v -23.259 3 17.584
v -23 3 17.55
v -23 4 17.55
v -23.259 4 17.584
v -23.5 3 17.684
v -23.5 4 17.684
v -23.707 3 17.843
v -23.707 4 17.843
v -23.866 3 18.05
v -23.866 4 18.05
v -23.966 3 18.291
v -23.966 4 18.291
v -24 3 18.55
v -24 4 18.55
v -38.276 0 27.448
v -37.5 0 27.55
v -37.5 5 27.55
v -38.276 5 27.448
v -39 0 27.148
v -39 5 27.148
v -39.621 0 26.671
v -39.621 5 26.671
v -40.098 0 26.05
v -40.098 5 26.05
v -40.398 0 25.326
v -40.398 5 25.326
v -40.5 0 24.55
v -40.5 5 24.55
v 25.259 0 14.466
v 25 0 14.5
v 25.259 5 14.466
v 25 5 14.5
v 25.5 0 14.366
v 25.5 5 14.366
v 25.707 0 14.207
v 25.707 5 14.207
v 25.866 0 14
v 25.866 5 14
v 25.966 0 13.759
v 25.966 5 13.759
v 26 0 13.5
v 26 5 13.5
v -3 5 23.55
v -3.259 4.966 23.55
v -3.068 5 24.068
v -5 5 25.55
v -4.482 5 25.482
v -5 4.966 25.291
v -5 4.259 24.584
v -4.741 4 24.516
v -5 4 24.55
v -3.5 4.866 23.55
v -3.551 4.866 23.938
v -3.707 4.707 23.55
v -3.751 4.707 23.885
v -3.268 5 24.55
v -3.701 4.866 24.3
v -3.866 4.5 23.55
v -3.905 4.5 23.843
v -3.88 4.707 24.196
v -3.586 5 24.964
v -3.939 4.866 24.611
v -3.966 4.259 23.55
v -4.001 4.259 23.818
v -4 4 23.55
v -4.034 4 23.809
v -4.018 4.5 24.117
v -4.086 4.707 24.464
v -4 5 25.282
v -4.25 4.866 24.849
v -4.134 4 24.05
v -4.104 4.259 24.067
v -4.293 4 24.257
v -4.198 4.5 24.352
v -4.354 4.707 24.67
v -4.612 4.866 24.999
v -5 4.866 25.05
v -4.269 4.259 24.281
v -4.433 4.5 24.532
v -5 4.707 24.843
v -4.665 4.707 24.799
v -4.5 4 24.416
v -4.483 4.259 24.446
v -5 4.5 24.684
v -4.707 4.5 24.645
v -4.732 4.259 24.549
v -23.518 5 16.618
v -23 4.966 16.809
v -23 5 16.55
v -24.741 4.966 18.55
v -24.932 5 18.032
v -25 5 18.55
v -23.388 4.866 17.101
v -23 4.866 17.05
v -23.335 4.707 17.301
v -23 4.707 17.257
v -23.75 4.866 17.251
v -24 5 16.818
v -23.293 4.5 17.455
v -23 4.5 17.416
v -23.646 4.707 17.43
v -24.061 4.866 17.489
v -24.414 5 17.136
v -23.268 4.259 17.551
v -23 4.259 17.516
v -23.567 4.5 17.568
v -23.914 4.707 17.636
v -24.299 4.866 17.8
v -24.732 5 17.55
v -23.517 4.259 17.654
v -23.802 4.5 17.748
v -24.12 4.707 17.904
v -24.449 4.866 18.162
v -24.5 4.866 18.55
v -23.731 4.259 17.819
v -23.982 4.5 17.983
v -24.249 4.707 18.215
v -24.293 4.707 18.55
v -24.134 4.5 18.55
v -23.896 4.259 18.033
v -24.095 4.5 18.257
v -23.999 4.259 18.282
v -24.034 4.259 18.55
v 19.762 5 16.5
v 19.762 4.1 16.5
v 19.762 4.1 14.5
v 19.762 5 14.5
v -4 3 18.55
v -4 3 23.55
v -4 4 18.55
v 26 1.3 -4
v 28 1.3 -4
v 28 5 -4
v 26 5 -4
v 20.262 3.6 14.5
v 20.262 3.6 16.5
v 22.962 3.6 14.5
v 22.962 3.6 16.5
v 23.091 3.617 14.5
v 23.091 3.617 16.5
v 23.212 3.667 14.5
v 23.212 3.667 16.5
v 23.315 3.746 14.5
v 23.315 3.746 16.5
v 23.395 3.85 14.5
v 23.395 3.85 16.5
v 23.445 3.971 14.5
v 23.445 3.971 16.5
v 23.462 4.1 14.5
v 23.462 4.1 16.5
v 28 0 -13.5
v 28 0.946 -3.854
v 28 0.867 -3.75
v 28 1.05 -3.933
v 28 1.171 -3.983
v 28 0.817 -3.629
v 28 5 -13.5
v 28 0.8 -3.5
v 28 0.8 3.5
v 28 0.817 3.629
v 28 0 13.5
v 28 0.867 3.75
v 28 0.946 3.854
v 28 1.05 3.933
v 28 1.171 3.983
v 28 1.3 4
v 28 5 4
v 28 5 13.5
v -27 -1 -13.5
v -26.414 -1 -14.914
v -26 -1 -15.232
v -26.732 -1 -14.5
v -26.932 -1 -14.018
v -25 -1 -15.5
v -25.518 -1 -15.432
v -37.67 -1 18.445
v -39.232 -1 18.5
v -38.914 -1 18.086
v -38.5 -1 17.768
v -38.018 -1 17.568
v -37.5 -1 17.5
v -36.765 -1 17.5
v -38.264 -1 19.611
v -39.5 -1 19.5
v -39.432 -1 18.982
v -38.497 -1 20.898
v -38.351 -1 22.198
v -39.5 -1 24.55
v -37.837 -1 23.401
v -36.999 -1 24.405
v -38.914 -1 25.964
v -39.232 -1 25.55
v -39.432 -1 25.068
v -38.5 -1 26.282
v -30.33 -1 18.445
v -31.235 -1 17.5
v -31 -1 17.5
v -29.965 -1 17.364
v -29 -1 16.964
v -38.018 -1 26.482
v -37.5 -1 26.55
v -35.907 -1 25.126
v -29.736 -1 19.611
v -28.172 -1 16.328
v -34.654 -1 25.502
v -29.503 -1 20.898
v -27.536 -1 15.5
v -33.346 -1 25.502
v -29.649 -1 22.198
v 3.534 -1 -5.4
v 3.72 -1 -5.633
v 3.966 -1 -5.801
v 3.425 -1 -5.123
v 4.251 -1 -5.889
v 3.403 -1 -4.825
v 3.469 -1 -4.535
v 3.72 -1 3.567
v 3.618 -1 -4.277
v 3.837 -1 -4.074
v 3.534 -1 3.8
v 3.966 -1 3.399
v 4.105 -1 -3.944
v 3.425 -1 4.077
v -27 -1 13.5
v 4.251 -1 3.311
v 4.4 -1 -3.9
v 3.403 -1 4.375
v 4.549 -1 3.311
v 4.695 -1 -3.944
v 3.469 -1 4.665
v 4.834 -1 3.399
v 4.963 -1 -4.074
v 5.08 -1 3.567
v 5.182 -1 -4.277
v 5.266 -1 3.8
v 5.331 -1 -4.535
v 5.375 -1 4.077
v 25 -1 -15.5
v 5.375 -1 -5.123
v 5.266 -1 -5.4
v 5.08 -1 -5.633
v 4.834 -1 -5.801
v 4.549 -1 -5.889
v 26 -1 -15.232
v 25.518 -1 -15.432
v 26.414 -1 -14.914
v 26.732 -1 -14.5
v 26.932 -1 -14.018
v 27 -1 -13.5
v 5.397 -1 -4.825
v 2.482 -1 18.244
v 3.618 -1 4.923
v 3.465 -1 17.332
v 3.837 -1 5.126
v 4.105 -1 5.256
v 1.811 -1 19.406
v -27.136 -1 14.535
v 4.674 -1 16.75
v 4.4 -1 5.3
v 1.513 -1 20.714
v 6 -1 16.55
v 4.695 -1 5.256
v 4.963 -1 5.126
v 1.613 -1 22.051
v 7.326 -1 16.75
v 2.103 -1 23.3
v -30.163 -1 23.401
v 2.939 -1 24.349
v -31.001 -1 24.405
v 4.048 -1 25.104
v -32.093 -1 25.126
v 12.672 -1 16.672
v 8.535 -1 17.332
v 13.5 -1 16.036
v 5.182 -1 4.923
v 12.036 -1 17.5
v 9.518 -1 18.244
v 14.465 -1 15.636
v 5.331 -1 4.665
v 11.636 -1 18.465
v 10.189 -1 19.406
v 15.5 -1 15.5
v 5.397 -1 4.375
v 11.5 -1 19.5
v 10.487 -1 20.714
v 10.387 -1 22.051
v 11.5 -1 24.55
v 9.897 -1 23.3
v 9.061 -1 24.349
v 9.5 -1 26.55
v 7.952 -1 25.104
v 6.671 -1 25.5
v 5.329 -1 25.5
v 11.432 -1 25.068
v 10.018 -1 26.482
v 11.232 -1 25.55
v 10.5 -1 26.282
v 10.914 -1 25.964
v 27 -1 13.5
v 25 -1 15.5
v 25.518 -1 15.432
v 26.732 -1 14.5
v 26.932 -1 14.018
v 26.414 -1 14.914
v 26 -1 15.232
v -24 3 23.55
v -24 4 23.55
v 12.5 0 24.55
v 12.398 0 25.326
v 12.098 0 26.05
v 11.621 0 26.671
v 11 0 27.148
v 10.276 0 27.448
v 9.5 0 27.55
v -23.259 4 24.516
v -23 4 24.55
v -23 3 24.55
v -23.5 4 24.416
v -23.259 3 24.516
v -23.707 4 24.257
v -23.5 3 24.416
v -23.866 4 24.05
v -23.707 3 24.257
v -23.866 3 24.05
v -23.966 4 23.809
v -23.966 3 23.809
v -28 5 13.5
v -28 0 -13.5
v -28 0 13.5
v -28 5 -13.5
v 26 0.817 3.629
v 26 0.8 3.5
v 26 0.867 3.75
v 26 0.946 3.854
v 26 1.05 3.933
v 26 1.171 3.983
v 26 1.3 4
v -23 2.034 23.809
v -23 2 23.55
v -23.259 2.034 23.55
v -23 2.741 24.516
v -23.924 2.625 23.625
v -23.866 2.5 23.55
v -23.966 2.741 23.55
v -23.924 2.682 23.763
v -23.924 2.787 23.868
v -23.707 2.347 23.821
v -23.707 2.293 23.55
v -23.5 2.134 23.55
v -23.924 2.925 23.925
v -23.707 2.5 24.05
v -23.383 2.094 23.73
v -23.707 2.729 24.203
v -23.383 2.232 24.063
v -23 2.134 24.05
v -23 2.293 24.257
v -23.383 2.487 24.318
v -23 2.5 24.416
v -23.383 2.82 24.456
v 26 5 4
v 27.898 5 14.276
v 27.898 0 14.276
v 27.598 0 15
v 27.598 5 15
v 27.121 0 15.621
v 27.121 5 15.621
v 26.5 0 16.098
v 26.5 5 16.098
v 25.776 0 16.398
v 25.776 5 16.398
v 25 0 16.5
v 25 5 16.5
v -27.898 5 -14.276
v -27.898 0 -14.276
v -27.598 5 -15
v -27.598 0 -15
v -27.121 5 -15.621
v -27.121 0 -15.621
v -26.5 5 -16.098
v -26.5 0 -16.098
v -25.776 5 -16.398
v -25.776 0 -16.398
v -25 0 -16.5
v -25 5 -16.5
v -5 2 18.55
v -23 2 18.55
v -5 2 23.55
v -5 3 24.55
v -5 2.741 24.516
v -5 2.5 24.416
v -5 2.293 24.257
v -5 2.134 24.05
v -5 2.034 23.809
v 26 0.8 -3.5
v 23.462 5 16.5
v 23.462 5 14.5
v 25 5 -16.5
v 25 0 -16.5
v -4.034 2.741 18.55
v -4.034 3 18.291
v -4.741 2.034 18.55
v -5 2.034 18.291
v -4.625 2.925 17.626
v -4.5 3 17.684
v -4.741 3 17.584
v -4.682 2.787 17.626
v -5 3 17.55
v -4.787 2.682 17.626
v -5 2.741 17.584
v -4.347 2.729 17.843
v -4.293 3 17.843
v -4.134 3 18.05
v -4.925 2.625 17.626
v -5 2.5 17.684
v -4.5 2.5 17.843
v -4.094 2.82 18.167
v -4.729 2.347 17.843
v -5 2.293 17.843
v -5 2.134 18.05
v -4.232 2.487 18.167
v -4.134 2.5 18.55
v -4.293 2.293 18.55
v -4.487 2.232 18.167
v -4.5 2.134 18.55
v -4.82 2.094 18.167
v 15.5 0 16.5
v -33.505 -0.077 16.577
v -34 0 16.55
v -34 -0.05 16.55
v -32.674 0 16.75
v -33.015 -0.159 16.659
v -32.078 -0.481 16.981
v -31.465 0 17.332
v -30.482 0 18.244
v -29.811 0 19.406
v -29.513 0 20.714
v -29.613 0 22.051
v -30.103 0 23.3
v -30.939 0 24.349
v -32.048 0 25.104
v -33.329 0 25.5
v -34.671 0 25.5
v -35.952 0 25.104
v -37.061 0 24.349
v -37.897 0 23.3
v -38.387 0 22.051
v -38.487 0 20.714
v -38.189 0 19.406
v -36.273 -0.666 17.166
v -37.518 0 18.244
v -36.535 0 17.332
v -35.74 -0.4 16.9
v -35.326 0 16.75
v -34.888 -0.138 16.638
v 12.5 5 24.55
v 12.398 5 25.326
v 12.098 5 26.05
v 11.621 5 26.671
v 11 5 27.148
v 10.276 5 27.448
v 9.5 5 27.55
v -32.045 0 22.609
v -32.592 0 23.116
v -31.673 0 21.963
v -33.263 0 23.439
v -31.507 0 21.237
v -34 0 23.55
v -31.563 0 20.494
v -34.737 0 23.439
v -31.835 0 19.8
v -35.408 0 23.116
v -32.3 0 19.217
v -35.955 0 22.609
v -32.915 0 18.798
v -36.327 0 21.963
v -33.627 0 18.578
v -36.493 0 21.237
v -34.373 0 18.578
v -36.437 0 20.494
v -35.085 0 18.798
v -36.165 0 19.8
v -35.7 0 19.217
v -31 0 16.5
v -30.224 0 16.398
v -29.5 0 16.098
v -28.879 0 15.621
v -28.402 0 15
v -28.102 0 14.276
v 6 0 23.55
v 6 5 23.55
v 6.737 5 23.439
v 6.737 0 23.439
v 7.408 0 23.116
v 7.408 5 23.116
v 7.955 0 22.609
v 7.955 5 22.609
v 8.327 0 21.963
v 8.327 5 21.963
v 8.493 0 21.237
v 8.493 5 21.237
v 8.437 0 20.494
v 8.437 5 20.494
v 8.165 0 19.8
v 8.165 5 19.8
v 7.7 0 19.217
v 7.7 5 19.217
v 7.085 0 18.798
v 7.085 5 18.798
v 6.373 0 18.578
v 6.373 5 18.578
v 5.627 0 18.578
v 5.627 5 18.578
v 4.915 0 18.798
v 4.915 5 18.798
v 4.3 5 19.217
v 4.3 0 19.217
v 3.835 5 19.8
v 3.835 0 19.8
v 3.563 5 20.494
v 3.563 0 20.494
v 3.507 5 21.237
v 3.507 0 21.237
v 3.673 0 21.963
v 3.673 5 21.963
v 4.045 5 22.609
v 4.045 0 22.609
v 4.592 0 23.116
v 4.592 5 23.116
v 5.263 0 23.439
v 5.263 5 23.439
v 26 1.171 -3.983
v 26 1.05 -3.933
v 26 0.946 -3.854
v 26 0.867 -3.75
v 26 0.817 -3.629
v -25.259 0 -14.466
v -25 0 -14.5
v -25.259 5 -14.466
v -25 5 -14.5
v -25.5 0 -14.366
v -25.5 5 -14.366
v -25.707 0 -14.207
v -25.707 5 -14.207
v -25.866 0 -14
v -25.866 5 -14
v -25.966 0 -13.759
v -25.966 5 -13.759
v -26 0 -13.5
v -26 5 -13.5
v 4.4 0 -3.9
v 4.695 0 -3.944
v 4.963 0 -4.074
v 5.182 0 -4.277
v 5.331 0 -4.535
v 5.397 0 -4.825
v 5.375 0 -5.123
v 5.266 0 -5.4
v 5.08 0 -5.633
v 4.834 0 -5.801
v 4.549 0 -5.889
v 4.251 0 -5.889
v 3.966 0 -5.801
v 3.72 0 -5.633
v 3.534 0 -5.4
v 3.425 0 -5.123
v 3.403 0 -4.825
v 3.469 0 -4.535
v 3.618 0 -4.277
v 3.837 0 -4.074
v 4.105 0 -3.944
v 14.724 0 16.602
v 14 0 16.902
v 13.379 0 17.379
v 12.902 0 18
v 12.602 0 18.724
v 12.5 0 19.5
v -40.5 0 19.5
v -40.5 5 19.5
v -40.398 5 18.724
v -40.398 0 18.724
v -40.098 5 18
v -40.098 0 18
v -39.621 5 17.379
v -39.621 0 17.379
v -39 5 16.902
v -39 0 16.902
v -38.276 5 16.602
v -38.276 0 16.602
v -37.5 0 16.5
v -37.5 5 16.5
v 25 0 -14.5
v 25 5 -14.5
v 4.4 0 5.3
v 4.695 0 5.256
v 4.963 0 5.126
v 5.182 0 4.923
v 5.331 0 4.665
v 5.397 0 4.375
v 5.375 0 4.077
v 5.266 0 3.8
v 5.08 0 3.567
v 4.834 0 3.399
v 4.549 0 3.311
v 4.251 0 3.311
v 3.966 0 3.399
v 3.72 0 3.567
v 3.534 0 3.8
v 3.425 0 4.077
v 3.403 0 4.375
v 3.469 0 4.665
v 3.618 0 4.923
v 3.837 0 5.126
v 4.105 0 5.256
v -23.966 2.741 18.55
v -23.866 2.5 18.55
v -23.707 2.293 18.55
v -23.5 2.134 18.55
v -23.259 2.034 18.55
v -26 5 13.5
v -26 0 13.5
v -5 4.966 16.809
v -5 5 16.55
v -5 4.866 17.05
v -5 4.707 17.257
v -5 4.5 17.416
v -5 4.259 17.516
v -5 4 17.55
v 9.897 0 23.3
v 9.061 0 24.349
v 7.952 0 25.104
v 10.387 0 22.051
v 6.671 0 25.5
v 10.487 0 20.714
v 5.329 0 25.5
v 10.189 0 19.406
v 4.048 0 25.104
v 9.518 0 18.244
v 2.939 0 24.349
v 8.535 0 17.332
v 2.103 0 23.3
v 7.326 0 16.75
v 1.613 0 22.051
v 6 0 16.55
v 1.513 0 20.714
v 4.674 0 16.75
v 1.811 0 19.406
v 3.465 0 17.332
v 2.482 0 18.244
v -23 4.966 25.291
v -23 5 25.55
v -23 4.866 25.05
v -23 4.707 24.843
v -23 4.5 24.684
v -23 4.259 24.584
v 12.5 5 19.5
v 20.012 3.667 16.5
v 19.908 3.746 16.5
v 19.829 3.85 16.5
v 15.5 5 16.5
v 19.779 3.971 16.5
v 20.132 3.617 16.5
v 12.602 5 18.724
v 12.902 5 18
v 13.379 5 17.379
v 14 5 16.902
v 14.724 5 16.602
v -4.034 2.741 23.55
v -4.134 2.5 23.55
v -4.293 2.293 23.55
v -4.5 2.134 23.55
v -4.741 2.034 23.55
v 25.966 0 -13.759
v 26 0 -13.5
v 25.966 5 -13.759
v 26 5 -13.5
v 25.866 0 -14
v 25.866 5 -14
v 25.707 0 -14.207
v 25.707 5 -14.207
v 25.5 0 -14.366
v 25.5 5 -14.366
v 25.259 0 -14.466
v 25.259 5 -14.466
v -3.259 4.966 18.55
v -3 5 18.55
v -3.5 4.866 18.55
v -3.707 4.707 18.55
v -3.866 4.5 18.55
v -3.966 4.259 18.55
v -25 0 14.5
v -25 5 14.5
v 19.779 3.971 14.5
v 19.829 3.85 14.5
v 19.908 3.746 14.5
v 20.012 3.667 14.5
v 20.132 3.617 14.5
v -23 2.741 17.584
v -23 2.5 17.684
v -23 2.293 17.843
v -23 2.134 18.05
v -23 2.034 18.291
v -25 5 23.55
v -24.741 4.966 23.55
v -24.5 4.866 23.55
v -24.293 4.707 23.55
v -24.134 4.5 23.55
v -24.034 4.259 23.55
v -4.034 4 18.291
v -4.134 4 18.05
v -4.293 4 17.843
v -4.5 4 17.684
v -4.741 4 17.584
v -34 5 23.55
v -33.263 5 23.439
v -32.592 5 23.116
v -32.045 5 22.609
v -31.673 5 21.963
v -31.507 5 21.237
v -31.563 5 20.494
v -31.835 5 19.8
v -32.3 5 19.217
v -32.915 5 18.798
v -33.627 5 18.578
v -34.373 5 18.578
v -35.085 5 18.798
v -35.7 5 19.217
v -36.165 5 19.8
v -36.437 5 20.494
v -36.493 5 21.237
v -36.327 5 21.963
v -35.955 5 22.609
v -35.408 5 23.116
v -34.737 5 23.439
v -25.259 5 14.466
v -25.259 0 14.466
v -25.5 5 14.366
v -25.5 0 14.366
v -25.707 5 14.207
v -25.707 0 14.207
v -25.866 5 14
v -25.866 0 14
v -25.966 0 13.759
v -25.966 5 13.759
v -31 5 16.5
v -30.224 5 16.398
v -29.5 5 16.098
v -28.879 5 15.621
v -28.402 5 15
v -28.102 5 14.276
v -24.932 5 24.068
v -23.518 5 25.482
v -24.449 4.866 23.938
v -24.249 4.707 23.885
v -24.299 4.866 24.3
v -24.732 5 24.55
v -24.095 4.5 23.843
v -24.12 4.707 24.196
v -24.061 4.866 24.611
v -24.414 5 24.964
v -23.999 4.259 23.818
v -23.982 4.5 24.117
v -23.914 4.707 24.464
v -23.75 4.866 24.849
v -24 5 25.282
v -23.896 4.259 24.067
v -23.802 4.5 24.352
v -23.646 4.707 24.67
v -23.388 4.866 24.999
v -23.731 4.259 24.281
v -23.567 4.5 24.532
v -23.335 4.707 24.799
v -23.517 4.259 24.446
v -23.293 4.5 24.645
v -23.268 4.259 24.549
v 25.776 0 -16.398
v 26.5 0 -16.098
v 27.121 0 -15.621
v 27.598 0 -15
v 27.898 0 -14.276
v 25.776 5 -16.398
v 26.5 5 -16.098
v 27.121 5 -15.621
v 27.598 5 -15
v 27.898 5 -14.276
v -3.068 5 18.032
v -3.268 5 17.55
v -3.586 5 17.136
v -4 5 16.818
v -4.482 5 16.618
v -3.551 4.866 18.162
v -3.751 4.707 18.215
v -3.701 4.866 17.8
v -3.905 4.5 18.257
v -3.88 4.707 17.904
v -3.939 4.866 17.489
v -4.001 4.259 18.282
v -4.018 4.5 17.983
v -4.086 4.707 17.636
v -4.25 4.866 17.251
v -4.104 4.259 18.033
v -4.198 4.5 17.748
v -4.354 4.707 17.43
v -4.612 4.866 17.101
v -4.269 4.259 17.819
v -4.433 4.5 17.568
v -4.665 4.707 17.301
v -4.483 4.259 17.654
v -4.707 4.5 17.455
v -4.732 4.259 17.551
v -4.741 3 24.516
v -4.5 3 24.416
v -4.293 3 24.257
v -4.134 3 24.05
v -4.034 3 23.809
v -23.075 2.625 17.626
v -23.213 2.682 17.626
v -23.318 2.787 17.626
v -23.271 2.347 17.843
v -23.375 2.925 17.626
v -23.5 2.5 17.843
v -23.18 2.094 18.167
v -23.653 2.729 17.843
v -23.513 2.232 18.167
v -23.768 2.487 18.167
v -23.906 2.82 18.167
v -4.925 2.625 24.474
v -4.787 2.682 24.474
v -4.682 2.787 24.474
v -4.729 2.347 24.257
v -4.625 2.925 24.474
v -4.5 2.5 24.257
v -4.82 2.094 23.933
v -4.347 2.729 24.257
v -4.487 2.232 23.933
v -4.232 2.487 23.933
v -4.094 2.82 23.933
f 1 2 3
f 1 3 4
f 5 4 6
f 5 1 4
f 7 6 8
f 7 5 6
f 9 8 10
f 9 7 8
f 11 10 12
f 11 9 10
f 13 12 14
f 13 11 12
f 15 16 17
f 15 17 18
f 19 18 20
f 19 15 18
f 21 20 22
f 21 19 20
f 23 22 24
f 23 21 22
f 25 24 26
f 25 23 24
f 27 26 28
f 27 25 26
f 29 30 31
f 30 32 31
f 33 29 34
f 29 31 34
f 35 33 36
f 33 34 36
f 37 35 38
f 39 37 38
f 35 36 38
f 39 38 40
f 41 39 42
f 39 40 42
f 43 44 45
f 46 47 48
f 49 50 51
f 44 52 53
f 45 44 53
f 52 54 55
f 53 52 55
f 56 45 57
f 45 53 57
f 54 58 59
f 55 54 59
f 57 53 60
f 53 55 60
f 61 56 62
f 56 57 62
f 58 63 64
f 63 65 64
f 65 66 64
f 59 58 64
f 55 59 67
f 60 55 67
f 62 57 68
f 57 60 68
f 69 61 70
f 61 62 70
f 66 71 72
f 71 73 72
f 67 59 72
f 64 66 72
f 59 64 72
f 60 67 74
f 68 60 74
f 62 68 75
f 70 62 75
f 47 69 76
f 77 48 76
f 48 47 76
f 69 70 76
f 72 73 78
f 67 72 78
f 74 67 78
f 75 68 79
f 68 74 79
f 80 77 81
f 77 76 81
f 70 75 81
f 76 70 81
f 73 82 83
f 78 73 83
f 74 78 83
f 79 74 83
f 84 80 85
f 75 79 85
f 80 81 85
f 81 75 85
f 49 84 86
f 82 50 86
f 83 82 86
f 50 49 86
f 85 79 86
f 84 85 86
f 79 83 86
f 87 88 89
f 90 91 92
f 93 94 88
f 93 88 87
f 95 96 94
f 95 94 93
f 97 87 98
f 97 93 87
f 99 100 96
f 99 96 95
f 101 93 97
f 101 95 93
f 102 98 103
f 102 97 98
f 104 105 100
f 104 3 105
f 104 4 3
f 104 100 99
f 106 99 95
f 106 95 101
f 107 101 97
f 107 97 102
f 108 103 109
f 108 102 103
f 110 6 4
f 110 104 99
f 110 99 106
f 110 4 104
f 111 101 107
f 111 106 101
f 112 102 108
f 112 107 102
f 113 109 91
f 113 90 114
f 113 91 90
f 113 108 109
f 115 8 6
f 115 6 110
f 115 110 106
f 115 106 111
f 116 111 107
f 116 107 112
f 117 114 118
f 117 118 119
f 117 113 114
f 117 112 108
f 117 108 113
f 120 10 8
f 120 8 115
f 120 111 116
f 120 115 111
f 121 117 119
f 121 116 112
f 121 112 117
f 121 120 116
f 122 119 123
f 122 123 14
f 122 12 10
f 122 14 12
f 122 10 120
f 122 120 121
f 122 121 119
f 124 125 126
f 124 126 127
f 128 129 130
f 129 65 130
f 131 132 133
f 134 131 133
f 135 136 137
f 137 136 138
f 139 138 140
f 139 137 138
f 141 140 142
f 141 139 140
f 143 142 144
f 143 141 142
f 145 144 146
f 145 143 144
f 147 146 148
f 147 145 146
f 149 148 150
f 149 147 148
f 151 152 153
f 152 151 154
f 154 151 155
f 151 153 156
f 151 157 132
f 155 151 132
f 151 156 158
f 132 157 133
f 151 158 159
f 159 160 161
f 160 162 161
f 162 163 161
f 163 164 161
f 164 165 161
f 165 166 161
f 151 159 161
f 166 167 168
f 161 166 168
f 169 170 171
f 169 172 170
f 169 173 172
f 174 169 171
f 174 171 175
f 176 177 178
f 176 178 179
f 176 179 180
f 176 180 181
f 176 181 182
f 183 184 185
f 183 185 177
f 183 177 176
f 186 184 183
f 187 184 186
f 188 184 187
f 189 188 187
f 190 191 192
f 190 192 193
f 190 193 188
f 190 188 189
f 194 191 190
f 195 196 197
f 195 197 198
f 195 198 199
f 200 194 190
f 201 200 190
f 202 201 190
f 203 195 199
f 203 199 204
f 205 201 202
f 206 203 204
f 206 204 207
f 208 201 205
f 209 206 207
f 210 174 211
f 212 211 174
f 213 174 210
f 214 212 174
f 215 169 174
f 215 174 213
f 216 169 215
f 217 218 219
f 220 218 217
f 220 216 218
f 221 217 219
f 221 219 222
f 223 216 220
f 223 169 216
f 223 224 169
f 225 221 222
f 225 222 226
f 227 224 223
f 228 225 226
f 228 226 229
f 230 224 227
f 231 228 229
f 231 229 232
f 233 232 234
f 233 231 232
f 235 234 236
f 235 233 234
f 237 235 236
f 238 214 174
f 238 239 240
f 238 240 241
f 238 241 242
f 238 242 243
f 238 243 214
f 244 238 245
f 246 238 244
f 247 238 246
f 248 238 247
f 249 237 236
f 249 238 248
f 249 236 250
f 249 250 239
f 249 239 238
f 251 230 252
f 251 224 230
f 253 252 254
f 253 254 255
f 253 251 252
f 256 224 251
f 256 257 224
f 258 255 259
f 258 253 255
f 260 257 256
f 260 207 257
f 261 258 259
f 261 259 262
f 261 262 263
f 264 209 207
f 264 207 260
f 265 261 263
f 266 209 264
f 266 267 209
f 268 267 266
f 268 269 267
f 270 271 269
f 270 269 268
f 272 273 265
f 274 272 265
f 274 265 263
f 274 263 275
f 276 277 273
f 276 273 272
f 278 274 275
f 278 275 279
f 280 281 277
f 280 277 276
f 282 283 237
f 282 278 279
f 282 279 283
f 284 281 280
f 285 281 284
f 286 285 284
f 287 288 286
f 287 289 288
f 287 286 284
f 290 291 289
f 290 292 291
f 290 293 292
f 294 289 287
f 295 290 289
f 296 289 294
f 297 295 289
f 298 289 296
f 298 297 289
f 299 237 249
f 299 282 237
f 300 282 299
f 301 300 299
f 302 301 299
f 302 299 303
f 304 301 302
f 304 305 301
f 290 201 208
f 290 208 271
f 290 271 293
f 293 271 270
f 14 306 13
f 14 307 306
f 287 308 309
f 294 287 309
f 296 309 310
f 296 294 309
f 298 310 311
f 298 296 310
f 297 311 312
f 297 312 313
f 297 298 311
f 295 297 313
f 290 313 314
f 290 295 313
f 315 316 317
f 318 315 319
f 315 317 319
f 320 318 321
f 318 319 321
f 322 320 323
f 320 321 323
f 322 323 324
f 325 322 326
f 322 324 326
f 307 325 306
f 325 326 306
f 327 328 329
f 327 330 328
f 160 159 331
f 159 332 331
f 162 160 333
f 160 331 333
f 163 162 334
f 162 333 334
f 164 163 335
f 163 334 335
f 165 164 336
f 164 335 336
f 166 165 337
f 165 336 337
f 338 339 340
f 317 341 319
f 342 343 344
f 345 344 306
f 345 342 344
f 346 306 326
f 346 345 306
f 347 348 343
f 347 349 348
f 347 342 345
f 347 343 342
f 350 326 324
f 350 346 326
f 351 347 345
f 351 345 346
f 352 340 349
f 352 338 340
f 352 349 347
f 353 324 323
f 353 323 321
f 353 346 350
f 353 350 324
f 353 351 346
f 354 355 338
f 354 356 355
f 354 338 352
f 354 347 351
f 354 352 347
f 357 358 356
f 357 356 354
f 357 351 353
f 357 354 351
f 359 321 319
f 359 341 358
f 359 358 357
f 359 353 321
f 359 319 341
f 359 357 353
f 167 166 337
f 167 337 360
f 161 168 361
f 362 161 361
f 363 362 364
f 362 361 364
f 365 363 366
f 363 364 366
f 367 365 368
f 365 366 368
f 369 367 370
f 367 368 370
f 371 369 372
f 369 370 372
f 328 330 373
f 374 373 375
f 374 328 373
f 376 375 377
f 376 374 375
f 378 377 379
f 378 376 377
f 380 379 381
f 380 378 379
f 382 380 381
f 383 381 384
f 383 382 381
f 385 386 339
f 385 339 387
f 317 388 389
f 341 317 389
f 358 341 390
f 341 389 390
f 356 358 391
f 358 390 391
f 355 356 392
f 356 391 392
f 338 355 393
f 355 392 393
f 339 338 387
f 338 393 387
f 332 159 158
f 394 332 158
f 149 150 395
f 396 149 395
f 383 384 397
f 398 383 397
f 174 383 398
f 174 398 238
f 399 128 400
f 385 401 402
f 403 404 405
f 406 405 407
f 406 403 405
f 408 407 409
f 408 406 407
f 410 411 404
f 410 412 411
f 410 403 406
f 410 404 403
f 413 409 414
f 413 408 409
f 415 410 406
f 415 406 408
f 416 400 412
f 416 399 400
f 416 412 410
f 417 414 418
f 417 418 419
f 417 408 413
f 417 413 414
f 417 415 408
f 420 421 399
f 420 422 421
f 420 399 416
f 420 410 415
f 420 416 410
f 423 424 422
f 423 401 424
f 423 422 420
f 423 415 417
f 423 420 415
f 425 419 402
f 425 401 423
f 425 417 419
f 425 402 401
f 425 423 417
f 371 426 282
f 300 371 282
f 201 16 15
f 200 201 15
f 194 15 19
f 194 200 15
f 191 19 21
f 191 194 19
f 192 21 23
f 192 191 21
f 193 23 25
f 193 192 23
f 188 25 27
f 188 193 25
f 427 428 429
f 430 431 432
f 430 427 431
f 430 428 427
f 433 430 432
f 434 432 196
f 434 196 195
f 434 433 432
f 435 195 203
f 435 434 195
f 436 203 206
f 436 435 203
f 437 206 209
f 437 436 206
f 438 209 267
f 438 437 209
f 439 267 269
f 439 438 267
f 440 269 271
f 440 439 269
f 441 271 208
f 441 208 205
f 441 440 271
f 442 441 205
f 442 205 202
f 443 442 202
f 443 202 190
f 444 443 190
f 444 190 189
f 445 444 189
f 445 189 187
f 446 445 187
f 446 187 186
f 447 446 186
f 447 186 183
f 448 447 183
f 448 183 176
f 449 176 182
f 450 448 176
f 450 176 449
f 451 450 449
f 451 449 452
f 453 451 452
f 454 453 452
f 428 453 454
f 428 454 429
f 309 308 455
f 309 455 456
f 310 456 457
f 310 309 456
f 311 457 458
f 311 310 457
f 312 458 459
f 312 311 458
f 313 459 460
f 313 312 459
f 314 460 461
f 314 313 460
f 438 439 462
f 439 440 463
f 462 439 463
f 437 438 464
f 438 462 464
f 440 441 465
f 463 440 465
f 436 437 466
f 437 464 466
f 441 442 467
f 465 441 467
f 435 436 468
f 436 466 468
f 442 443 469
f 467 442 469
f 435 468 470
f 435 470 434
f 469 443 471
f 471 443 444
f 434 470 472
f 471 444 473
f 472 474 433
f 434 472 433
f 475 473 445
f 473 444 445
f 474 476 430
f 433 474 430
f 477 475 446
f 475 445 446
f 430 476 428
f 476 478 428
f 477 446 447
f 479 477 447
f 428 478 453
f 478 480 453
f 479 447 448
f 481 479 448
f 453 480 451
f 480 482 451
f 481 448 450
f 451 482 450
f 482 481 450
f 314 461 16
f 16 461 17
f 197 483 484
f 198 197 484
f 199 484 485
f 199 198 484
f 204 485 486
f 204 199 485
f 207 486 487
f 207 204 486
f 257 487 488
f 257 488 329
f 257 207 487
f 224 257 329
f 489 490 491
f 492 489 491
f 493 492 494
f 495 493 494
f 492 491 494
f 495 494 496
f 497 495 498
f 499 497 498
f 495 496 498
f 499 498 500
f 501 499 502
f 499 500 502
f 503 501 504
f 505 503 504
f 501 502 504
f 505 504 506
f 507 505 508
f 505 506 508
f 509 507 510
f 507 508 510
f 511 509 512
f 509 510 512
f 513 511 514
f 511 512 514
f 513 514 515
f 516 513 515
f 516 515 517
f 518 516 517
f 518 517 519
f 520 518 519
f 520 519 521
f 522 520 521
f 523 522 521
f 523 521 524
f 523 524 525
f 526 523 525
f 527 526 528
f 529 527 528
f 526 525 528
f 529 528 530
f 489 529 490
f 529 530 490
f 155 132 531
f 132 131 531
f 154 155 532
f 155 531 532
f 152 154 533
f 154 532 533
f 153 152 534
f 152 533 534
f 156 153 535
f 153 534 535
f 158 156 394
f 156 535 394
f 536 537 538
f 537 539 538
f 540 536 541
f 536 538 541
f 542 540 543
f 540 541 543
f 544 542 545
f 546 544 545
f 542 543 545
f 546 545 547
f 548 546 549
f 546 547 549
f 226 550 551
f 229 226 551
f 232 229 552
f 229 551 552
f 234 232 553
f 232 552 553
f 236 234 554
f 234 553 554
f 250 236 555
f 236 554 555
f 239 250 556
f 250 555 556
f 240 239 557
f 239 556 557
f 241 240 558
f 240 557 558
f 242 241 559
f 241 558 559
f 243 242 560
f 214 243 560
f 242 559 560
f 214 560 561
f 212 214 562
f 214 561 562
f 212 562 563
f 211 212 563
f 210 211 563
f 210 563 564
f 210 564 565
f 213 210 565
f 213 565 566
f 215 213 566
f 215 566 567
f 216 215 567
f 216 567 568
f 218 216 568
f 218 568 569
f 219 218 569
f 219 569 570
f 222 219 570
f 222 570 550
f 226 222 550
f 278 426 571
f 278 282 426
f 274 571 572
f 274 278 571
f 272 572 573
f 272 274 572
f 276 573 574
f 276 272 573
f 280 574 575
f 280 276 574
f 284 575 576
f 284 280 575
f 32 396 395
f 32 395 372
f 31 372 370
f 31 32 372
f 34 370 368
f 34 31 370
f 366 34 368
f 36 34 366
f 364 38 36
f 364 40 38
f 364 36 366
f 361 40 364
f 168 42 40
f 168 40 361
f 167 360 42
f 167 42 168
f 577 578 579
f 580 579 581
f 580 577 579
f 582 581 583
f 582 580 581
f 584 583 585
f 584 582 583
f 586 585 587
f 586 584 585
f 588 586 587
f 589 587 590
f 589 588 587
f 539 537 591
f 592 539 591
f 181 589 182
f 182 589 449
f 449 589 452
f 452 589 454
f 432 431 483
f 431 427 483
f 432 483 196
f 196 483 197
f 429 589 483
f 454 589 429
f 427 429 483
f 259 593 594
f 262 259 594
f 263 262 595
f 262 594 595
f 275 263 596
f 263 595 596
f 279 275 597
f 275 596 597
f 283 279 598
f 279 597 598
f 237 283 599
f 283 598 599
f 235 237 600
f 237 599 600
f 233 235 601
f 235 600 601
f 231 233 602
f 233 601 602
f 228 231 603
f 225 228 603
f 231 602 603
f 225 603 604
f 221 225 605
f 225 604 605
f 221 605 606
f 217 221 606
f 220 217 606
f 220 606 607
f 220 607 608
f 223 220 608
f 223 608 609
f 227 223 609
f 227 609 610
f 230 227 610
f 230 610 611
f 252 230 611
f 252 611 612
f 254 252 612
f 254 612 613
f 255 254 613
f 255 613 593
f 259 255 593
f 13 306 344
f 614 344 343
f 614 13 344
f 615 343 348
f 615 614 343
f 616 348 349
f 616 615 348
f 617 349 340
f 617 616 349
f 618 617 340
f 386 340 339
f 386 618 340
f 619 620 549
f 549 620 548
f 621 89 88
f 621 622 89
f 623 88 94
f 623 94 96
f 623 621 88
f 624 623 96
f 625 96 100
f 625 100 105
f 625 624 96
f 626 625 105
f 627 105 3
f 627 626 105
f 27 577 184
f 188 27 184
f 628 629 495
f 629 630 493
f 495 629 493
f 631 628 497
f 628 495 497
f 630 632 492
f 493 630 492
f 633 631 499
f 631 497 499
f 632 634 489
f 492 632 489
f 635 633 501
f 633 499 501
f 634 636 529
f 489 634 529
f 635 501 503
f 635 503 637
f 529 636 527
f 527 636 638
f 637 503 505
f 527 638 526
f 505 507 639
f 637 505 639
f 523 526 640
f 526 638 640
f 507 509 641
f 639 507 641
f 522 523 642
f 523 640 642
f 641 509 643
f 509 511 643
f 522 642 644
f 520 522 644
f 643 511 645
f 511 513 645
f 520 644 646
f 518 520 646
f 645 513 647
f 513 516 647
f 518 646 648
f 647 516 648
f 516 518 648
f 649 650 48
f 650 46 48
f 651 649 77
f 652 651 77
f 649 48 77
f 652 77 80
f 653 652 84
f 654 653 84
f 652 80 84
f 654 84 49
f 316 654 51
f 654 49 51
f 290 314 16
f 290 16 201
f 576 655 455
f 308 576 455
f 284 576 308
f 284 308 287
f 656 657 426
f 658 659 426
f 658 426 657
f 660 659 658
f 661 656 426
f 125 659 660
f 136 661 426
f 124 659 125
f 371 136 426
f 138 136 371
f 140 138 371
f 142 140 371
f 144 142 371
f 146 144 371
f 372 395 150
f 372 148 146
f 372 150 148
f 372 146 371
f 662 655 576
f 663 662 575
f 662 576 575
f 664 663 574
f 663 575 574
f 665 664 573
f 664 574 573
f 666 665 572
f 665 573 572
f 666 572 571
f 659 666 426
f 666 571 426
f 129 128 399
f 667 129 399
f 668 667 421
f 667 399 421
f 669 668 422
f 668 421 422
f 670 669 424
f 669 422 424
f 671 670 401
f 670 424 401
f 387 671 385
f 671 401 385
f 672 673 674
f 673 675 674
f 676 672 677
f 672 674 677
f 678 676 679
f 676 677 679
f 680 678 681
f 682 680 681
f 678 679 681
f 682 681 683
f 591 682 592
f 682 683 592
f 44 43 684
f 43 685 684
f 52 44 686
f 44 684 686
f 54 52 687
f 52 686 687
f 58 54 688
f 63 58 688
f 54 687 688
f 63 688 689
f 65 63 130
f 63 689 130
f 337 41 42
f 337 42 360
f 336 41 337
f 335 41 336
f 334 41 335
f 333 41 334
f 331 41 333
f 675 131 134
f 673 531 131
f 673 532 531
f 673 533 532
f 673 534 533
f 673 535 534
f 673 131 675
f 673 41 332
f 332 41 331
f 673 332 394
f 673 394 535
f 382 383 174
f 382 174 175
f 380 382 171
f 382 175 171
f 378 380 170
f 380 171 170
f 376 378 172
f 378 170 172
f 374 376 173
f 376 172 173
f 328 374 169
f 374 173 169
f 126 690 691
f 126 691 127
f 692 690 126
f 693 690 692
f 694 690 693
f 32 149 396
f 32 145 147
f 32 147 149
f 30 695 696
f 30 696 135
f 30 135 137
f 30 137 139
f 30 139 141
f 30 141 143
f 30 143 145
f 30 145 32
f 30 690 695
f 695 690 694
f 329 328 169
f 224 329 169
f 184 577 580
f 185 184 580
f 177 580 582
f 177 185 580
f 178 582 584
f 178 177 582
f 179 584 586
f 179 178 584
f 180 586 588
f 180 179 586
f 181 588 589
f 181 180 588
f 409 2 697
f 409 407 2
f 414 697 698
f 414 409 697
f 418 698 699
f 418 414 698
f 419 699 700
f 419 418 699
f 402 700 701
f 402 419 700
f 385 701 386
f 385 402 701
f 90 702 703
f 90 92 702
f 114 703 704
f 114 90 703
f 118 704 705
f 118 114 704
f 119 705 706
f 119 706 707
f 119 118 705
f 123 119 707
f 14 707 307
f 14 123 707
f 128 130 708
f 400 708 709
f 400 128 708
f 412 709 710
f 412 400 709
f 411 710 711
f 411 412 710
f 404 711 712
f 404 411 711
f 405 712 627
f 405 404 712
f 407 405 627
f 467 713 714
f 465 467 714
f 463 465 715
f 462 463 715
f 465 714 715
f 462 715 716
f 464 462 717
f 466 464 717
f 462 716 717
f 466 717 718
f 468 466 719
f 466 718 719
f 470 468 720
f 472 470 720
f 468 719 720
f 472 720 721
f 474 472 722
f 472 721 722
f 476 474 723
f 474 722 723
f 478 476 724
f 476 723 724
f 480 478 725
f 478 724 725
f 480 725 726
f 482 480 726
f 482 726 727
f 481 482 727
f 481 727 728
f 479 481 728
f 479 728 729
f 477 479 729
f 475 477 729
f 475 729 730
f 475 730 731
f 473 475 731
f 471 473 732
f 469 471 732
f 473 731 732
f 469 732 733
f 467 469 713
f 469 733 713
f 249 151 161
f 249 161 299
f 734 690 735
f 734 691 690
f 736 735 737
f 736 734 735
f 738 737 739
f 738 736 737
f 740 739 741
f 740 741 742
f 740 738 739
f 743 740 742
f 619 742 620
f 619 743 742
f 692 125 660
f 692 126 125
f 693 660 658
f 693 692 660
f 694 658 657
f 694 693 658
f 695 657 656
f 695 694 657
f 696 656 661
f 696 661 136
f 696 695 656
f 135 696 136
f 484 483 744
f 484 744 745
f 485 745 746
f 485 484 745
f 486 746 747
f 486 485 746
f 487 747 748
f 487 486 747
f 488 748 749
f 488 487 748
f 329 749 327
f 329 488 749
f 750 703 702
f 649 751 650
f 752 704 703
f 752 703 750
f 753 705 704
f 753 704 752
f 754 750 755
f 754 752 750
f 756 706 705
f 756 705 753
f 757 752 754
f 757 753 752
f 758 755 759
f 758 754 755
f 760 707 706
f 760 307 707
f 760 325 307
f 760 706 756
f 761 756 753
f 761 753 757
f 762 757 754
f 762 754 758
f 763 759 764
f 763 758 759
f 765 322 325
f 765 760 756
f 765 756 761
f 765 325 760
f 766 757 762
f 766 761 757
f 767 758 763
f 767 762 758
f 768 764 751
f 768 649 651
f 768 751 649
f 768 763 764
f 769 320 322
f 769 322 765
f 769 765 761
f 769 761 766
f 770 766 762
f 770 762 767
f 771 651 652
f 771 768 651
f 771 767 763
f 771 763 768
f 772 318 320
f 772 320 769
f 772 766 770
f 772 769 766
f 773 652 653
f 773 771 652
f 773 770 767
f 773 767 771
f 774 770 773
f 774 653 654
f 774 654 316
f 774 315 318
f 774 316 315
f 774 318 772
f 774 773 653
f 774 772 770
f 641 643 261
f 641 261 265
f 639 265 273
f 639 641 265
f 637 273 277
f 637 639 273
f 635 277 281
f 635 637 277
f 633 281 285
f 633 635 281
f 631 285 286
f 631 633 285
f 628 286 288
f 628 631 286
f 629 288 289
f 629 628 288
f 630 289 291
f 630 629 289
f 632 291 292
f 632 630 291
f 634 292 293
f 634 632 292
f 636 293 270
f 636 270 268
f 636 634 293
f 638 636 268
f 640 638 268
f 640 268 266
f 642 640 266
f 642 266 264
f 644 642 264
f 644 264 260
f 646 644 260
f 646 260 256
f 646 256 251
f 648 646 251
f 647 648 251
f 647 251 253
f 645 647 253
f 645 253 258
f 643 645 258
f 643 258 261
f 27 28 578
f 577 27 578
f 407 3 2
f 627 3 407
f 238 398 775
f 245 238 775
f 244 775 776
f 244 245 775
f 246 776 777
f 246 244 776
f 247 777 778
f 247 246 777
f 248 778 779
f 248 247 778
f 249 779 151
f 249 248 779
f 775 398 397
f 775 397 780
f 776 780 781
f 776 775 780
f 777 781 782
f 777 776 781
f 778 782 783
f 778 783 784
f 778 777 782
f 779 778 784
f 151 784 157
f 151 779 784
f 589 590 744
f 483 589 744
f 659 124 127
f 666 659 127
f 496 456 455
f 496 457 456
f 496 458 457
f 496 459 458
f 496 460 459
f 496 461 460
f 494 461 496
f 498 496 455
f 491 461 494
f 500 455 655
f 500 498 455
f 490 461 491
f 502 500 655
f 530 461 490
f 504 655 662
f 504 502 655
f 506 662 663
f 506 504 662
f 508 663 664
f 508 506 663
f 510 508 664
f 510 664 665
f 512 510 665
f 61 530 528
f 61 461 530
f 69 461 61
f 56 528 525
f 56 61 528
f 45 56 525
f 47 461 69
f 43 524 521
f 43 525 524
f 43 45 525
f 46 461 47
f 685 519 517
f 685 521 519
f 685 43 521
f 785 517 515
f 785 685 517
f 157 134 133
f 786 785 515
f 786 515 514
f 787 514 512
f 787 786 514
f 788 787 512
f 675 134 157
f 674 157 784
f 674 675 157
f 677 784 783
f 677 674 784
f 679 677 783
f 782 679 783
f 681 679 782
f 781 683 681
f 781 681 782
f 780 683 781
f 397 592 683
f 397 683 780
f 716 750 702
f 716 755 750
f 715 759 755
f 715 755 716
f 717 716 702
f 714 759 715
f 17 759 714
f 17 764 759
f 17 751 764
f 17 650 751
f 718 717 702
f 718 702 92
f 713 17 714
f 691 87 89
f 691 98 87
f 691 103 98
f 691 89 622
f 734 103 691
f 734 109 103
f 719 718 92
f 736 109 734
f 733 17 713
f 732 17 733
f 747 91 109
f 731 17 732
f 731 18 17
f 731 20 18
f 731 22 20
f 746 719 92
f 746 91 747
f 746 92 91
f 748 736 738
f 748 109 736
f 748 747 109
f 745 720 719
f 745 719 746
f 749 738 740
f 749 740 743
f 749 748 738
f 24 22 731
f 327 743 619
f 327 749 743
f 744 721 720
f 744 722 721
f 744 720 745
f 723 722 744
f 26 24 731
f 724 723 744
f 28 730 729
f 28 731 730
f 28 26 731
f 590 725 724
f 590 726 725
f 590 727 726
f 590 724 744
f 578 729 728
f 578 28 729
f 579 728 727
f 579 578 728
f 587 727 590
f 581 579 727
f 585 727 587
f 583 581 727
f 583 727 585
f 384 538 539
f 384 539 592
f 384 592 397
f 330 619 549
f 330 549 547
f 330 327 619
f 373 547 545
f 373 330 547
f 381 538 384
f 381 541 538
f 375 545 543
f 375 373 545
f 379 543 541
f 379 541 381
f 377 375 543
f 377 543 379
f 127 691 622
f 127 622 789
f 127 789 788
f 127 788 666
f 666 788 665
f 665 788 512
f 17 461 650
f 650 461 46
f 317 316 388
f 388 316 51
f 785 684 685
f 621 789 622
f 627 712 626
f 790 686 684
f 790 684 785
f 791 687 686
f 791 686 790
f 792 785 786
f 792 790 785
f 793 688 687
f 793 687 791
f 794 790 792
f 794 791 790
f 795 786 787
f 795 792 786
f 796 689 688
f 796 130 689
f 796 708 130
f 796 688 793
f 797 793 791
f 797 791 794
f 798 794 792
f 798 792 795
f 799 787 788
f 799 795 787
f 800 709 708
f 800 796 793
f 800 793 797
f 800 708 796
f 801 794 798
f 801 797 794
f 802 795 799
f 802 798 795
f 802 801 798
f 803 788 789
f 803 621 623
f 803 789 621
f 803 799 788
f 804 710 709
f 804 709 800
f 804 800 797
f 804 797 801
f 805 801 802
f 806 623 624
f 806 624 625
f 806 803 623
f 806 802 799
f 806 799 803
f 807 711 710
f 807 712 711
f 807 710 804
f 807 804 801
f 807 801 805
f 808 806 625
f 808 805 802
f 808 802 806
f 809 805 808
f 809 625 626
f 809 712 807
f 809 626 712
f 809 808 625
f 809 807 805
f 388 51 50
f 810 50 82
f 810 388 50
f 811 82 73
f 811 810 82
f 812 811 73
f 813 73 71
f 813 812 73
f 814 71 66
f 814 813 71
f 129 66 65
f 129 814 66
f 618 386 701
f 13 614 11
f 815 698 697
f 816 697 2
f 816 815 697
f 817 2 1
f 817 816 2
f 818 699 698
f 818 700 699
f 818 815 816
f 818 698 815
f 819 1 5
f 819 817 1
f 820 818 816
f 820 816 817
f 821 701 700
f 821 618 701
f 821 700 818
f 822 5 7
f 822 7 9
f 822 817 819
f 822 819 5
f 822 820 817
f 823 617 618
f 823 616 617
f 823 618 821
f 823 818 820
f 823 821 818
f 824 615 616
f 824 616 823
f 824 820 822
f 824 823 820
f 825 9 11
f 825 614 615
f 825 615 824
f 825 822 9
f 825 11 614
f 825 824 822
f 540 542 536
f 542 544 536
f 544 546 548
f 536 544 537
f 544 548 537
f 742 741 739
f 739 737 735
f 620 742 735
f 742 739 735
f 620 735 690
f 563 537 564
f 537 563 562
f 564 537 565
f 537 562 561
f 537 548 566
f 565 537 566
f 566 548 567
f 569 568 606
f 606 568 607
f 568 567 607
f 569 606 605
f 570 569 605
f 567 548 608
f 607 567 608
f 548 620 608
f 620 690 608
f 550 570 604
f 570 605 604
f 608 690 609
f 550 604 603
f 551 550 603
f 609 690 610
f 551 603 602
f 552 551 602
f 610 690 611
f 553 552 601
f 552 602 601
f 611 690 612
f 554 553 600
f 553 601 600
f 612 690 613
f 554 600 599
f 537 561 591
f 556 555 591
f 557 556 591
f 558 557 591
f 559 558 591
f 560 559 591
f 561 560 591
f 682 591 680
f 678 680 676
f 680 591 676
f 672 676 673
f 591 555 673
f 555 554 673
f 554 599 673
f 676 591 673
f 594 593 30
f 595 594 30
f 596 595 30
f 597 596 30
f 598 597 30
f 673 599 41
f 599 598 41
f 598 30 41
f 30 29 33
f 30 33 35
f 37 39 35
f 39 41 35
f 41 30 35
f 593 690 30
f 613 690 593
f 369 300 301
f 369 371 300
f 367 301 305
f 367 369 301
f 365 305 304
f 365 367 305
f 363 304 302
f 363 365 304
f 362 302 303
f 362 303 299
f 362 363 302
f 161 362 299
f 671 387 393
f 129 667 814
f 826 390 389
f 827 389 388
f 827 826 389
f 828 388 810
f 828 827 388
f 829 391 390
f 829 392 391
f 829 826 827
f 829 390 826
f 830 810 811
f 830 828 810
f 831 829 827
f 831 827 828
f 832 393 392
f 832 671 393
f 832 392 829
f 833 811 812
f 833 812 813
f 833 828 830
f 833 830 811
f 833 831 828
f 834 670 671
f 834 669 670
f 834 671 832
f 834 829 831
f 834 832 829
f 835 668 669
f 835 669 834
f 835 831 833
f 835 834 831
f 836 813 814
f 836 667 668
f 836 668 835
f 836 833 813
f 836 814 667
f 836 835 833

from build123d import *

# Parameters (mm, degrees)
SKETCH1_W           = 56
SKETCH1_H           = 33
SKETCH1_W_2         = 52
SKETCH1_H_2         = 29
BOSS_EXTRUDE1_DEPTH = 5
SKETCH2_W           = 56
SKETCH2_H           = 33
BOSS_EXTRUDE2_DEPTH = 1
FILLET1_R           = 3
FILLET2_R           = 1
SKETCH3_W           = 8
SKETCH3_H           = 8.4
CUT_EXTRUDE1_DEPTH  = 10
SKETCH9_W           = 3.7
SKETCH9_H           = 2.8
CUT_EXTRUDE4_DEPTH  = 3
BOSS_EXTRUDE6_START = -6
SKETCH5_R           = 4.5
BOSS_EXTRUDE6_DEPTH = 6
SKETCH7_R           = 4.5
SKETCH7_R_2         = 2.5
BOSS_EXTRUDE7_DEPTH = 5
FILLET4_R           = 3
SKETCH8_W           = 20
SKETCH8_H           = 7
CUT_EXTRUDE3_DEPTH  = 3
FILLET5_R           = 1
CHAMFER2_SIZE       = 1
FILLET6_R           = 0.5
SKETCH10_R          = 1
CUT_EXTRUDE5_DEPTH  = 3


with BuildPart() as part:
    # Sketch1 → Boss-Extrude1 (new body)
    with BuildSketch(Plane(origin=(0, 0, 0), x_dir=(1, 0, 0), z_dir=(0, 1, 0))):
        Rectangle(SKETCH1_W, SKETCH1_H)
        Rectangle(SKETCH1_W_2, SKETCH1_H_2, mode=Mode.SUBTRACT)
    extrude(amount=BOSS_EXTRUDE1_DEPTH)

    # Sketch2 → Boss-Extrude2 (add)
    with BuildSketch(Plane.XZ):
        Rectangle(SKETCH2_W, SKETCH2_H)
    extrude(amount=BOSS_EXTRUDE2_DEPTH)

    # Fillet1
    fillet1_edges = [part.edges().sort_by_distance(p)[0] for p in [
        (-28, 2, -16.5),
        (28, 2, -16.5),
        (28, 2, 16.5),
        (-28, 2, 16.5),
    ]]
    fillet(fillet1_edges, radius=FILLET1_R)

    # Fillet2
    fillet2_edges = [part.edges().sort_by_distance(p)[0] for p in [
        (26, 2.5, 14.5),
        (26, 2.5, -14.5),
        (-26, 2.5, -14.5),
        (-26, 2.5, 14.5),
    ]]
    fillet(fillet2_edges, radius=FILLET2_R)

    # Sketch3 → Cut-Extrude1 (cut)
    with BuildSketch(Plane(origin=(28, 0, 0), x_dir=(0, 0, -1), z_dir=(1, 0, 0))):
        with Locations((0, 5)):
            Rectangle(SKETCH3_W, SKETCH3_H)
    extrude(amount=-CUT_EXTRUDE1_DEPTH, mode=Mode.SUBTRACT)

    # Sketch9 → Cut-Extrude4 (cut)
    with BuildSketch(Plane.XY.offset(16.5)):
        with Locations((21.611723176, 5)):
            Rectangle(SKETCH9_W, SKETCH9_H)
    extrude(amount=-CUT_EXTRUDE4_DEPTH, mode=Mode.SUBTRACT)

    # Sketch5 → Boss-Extrude6 (add)
    # profile 1 of 3: a face of its own
    with BuildSketch(Plane.XZ.offset(1).offset(BOSS_EXTRUDE6_START)):
        Polygon((-25, 16.5), (12.5, 16.5), (12.5, 27.55), (-40.5, 27.55), (-40.5, 16.5), (-28, 16.5), align=None)
        with Locations(Location((-34, 21.05, 0), (0, 0, 270))):
            Circle(SKETCH5_R, mode=Mode.SUBTRACT)
        with Locations(Location((6, 21.05, 0), (0, 0, 270))):
            Circle(SKETCH5_R, mode=Mode.SUBTRACT)
    # profile 2 of 3: a face of its own
    with BuildSketch(Plane.XZ.offset(1).offset(BOSS_EXTRUDE6_START)):
        with BuildLine():
            ThreePointArc((-27.252149964, 15.481872988), (-26.2357955, 16.233643993), (-25, 16.5))
            Line((-25, 16.5), (-28, 16.5))
            Line((-28, 16.5), (-28, 15.481872988))
            Line((-28, 15.481872988), (-27.252149964, 15.481872988))
        make_face()
    # profile 3 of 3: a face of its own
    with BuildSketch(Plane.XZ.offset(1).offset(BOSS_EXTRUDE6_START)):
        with BuildLine():
            ThreePointArc((-28, 13.5), (-27.806817583, 14.559138826), (-27.252149964, 15.481872988))
            Line((-27.252149964, 15.481872988), (-28, 15.481872988))
            Line((-28, 15.481872988), (-28, 13.5))
        make_face()
    extrude(amount=BOSS_EXTRUDE6_DEPTH)

    # Sketch7 → Boss-Extrude7 (add)
    # profile 1 of 2: a face of its own
    with BuildSketch(Plane(origin=(0, 5, 0), x_dir=(1, 0, 0), z_dir=(0, 1, 0))):
        with Locations(Location((6, -21.05, 0), (0, 0, 90))):
            Circle(SKETCH7_R)
        with Locations(Location((6, -21.05, 0), (0, 0, 270))):
            Circle(SKETCH7_R_2, mode=Mode.SUBTRACT)
    # profile 2 of 2: a face of its own
    with BuildSketch(Plane(origin=(0, 5, 0), x_dir=(1, 0, 0), z_dir=(0, 1, 0))):
        with Locations(Location((-34, -21.05, 0), (0, 0, 90))):
            Circle(SKETCH7_R)
        with Locations(Location((-34, -21.05, 0), (0, 0, 270))):
            Circle(SKETCH7_R_2, mode=Mode.SUBTRACT)
    extrude(amount=-BOSS_EXTRUDE7_DEPTH)

    # Fillet4
    fillet4_edges = [part.edges().sort_by_distance(p)[0] for p in [
        (-40.5, 2, 16.5),
        (-40.5, 2, 27.55),
        (12.5, 2, 27.55),
        (12.5, 2, 16.5),
        (-28, 2, 16.5),
    ]]
    fillet(fillet4_edges, radius=FILLET4_R)

    # Sketch8 → Cut-Extrude3 (cut)
    with BuildSketch(Plane(origin=(0, 5, 0), x_dir=(1, 0, 0), z_dir=(0, 1, 0))):
        with Locations((-14, -21.05)):
            Rectangle(SKETCH8_W, SKETCH8_H)
    extrude(amount=-CUT_EXTRUDE3_DEPTH, mode=Mode.SUBTRACT)

    # Fillet5
    fillet5_edges = [part.edges().sort_by_distance(p)[0] for p in [
        (-4, 2, 21.05),
        (-4, 3.5, 17.55),
        (-14, 2, 24.55),
        (-4, 3.5, 24.55),
        (-24, 2, 21.05),
        (-24, 3.5, 24.55),
        (-14, 2, 17.55),
        (-24, 3.5, 17.55),
        (-4, 5, 21.05),
        (-14, 5, 17.55),
        (-24, 5, 21.05),
        (-14, 5, 24.55),
    ]]
    fillet(fillet5_edges, radius=FILLET5_R)

    # Chamfer2
    # the kernel refuses this chamfer: 1 mm, written as the material it takes off along each edge
    with BuildSketch(Plane(origin=(12.5, -1, 19.5), x_dir=(0.02749587661058563, 0.9996219169112968, 0), z_dir=(0, 0, 1)), Plane(origin=(-40.5, -1, 24.55), x_dir=(-0.02749587661058908, 0.9996219169112968, 0), z_dir=(0, 0, -1))) as chamfer2_piece_1:
        Polygon((CHAMFER2_SIZE * 0.999621916911, CHAMFER2_SIZE * 0.0274958766106), (-CHAMFER2_SIZE * 0.0274958766106, CHAMFER2_SIZE * 0.999621916911), (0, 0), align=None)
    extrude(amount=5.05, mode=Mode.SUBTRACT)
    with BuildSketch(Plane(origin=(9.5, -1, 27.55), x_dir=(0, 0.9996219169112968, 0.02749587661058563), z_dir=(-1, 0, 0))) as chamfer2_piece_2:
        Polygon((CHAMFER2_SIZE * 0.999621916911, CHAMFER2_SIZE * 0.0274958766106), (-CHAMFER2_SIZE * 0.0274958766106, CHAMFER2_SIZE * 0.999621916911), (0, 0), align=None)
    extrude(amount=47, mode=Mode.SUBTRACT)
    with BuildSketch(Plane(origin=(-31, -1, 16.5), x_dir=(0, 0.9996219169112968, -0.02749587661058563), z_dir=(-1, 0, 0))) as chamfer2_piece_3:
        Polygon((CHAMFER2_SIZE * 0.999621916911, -CHAMFER2_SIZE * 0.0274958766106), (-CHAMFER2_SIZE * 0.0274958766106, -CHAMFER2_SIZE * 0.999621916911), (0, 0), align=None)
    extrude(amount=6.5, mode=Mode.SUBTRACT)
    with BuildSketch(Plane(origin=(-28, -1, -13.5), x_dir=(-0.02749587661058563, 0.9996219169112968, 0), z_dir=(0, 0, 1))) as chamfer2_piece_4:
        Polygon((CHAMFER2_SIZE * 0.999621916911, -CHAMFER2_SIZE * 0.0274958766106), (-CHAMFER2_SIZE * 0.0274958766106, -CHAMFER2_SIZE * 0.999621916911), (0, 0), align=None)
    extrude(amount=27, mode=Mode.SUBTRACT)
    with BuildSketch(Plane(origin=(-37.5, -1, 19.5), x_dir=(-1, 0, 0), z_dir=(0, 0, 1))) as chamfer2_piece_5:
        Polygon((3, -CHAMFER2_SIZE), (3 - CHAMFER2_SIZE, 0), (3, 0), align=None)
    revolve(axis=Axis((-37.5, -1, 19.5), (0, -1, 0)), revolution_arc=90, mode=Mode.SUBTRACT)
    with BuildSketch(Plane(origin=(-37.5, -1, 24.55), x_dir=(0, 0, 1), z_dir=(1, 0, 0))) as chamfer2_piece_6:
        Polygon((3, -CHAMFER2_SIZE), (3 - CHAMFER2_SIZE, 0), (3, 0), align=None)
    revolve(axis=Axis((-37.5, -1, 24.55), (0, -1, 0)), revolution_arc=90, mode=Mode.SUBTRACT)
    with BuildSketch(Plane(origin=(9.5, -1, 24.55), x_dir=(1, 0, 0), z_dir=(0, 0, -1))) as chamfer2_piece_7:
        Polygon((3, -CHAMFER2_SIZE), (3 - CHAMFER2_SIZE, 0), (3, 0), align=None)
    revolve(axis=Axis((9.5, -1, 24.55), (0, -1, 0)), revolution_arc=90, mode=Mode.SUBTRACT)
    with BuildSketch(Plane(origin=(15.5, -1, 19.5), x_dir=(0, 0, -1), z_dir=(1, 0, 0))) as chamfer2_piece_8:
        Polygon((3, CHAMFER2_SIZE), (3 + CHAMFER2_SIZE, 0), (3, 0), align=None)
    revolve(axis=Axis((15.5, -1, 19.5), (0, 1, 0)), revolution_arc=90, mode=Mode.SUBTRACT)
    with BuildSketch(Plane(origin=(-31, -1, 13.5), x_dir=(0, 0, 1), z_dir=(-1, 0, 0))) as chamfer2_piece_9:
        Polygon((3, CHAMFER2_SIZE), (3 + CHAMFER2_SIZE, 0), (3, 0), align=None)
    revolve(axis=Axis((-31, -1, 13.5), (0, 1, 0)), revolution_arc=90, mode=Mode.SUBTRACT)
    with BuildSketch(Plane(origin=(28, -1, -13.5), x_dir=(0.02749587661058563, 0.9996219169112968, 0), z_dir=(0, 0, 1))) as chamfer2_piece_10:
        Polygon((CHAMFER2_SIZE * 0.999621916911, CHAMFER2_SIZE * 0.0274958766106), (-CHAMFER2_SIZE * 0.0274958766106, CHAMFER2_SIZE * 0.999621916911), (0, 0), align=None)
    extrude(amount=27, mode=Mode.SUBTRACT)
    with BuildSketch(Plane(origin=(25, -1, 16.5), x_dir=(0, 0.9996219169112968, 0.02749587661058563), z_dir=(-1, 0, 0))) as chamfer2_piece_11:
        Polygon((CHAMFER2_SIZE * 0.999621916911, CHAMFER2_SIZE * 0.0274958766106), (-CHAMFER2_SIZE * 0.0274958766106, CHAMFER2_SIZE * 0.999621916911), (0, 0), align=None)
    extrude(amount=9.5, mode=Mode.SUBTRACT)
    with BuildSketch(Plane(origin=(-25, -1, -16.5), x_dir=(0, 0.9996219169112968, -0.02749587661058563), z_dir=(1, 0, 0))) as chamfer2_piece_12:
        Polygon((CHAMFER2_SIZE * 0.999621916911, CHAMFER2_SIZE * 0.0274958766106), (-CHAMFER2_SIZE * 0.0274958766106, CHAMFER2_SIZE * 0.999621916911), (0, 0), align=None)
    extrude(amount=50, mode=Mode.SUBTRACT)
    with BuildSketch(Plane(origin=(-25, -1, -13.5), x_dir=(0, 0, -1), z_dir=(1, 0, 0))) as chamfer2_piece_13:
        Polygon((3, CHAMFER2_SIZE), (3 - CHAMFER2_SIZE, 0), (3, 0), align=None)
    revolve(axis=Axis((-25, -1, -13.5), (0, 1, 0)), revolution_arc=90, mode=Mode.SUBTRACT)
    with BuildSketch(Plane(origin=(25, -1, -13.5), x_dir=(0, 0, -1), z_dir=(-1, 0, 0))) as chamfer2_piece_14:
        Polygon((3, -CHAMFER2_SIZE), (3 - CHAMFER2_SIZE, 0), (3, 0), align=None)
    revolve(axis=Axis((25, -1, -13.5), (0, -1, 0)), revolution_arc=90, mode=Mode.SUBTRACT)
    with BuildSketch(Plane(origin=(25, -1, 13.5), x_dir=(0, 0, 1), z_dir=(-1, 0, 0))) as chamfer2_piece_15:
        Polygon((3 - CHAMFER2_SIZE, 0), (3, CHAMFER2_SIZE), (3, 0), align=None)
    revolve(axis=Axis((25, -1, 13.5), (0, 1, 0)), revolution_arc=90, mode=Mode.SUBTRACT)

    # Fillet6
    fillet6_edges = [part.edges().sort_by_distance(p)[0] for p in [
        (27, 0.8, -4),
        (19.761723176, 3.6, 15.5),
        (23.461723176, 3.6, 15.5),
        (27, 0.8, 4),
    ]]
    fillet(fillet6_edges, radius=FILLET6_R)

    # Sketch10 → Cut-Extrude5 (cut)
    with BuildSketch(Plane(origin=(0, 0, 0), x_dir=(1, 0, 0), z_dir=(0, 1, 0))):
        with Locations(Location((4.4, 4.9, 0), (0, 0, 270))):
            Circle(SKETCH10_R)
        with Locations(Location((4.4, -4.3, 0), (0, 0, 270))):
            Circle(SKETCH10_R)
    extrude(amount=-CUT_EXTRUDE5_DEPTH, mode=Mode.SUBTRACT)


solid = part.part
